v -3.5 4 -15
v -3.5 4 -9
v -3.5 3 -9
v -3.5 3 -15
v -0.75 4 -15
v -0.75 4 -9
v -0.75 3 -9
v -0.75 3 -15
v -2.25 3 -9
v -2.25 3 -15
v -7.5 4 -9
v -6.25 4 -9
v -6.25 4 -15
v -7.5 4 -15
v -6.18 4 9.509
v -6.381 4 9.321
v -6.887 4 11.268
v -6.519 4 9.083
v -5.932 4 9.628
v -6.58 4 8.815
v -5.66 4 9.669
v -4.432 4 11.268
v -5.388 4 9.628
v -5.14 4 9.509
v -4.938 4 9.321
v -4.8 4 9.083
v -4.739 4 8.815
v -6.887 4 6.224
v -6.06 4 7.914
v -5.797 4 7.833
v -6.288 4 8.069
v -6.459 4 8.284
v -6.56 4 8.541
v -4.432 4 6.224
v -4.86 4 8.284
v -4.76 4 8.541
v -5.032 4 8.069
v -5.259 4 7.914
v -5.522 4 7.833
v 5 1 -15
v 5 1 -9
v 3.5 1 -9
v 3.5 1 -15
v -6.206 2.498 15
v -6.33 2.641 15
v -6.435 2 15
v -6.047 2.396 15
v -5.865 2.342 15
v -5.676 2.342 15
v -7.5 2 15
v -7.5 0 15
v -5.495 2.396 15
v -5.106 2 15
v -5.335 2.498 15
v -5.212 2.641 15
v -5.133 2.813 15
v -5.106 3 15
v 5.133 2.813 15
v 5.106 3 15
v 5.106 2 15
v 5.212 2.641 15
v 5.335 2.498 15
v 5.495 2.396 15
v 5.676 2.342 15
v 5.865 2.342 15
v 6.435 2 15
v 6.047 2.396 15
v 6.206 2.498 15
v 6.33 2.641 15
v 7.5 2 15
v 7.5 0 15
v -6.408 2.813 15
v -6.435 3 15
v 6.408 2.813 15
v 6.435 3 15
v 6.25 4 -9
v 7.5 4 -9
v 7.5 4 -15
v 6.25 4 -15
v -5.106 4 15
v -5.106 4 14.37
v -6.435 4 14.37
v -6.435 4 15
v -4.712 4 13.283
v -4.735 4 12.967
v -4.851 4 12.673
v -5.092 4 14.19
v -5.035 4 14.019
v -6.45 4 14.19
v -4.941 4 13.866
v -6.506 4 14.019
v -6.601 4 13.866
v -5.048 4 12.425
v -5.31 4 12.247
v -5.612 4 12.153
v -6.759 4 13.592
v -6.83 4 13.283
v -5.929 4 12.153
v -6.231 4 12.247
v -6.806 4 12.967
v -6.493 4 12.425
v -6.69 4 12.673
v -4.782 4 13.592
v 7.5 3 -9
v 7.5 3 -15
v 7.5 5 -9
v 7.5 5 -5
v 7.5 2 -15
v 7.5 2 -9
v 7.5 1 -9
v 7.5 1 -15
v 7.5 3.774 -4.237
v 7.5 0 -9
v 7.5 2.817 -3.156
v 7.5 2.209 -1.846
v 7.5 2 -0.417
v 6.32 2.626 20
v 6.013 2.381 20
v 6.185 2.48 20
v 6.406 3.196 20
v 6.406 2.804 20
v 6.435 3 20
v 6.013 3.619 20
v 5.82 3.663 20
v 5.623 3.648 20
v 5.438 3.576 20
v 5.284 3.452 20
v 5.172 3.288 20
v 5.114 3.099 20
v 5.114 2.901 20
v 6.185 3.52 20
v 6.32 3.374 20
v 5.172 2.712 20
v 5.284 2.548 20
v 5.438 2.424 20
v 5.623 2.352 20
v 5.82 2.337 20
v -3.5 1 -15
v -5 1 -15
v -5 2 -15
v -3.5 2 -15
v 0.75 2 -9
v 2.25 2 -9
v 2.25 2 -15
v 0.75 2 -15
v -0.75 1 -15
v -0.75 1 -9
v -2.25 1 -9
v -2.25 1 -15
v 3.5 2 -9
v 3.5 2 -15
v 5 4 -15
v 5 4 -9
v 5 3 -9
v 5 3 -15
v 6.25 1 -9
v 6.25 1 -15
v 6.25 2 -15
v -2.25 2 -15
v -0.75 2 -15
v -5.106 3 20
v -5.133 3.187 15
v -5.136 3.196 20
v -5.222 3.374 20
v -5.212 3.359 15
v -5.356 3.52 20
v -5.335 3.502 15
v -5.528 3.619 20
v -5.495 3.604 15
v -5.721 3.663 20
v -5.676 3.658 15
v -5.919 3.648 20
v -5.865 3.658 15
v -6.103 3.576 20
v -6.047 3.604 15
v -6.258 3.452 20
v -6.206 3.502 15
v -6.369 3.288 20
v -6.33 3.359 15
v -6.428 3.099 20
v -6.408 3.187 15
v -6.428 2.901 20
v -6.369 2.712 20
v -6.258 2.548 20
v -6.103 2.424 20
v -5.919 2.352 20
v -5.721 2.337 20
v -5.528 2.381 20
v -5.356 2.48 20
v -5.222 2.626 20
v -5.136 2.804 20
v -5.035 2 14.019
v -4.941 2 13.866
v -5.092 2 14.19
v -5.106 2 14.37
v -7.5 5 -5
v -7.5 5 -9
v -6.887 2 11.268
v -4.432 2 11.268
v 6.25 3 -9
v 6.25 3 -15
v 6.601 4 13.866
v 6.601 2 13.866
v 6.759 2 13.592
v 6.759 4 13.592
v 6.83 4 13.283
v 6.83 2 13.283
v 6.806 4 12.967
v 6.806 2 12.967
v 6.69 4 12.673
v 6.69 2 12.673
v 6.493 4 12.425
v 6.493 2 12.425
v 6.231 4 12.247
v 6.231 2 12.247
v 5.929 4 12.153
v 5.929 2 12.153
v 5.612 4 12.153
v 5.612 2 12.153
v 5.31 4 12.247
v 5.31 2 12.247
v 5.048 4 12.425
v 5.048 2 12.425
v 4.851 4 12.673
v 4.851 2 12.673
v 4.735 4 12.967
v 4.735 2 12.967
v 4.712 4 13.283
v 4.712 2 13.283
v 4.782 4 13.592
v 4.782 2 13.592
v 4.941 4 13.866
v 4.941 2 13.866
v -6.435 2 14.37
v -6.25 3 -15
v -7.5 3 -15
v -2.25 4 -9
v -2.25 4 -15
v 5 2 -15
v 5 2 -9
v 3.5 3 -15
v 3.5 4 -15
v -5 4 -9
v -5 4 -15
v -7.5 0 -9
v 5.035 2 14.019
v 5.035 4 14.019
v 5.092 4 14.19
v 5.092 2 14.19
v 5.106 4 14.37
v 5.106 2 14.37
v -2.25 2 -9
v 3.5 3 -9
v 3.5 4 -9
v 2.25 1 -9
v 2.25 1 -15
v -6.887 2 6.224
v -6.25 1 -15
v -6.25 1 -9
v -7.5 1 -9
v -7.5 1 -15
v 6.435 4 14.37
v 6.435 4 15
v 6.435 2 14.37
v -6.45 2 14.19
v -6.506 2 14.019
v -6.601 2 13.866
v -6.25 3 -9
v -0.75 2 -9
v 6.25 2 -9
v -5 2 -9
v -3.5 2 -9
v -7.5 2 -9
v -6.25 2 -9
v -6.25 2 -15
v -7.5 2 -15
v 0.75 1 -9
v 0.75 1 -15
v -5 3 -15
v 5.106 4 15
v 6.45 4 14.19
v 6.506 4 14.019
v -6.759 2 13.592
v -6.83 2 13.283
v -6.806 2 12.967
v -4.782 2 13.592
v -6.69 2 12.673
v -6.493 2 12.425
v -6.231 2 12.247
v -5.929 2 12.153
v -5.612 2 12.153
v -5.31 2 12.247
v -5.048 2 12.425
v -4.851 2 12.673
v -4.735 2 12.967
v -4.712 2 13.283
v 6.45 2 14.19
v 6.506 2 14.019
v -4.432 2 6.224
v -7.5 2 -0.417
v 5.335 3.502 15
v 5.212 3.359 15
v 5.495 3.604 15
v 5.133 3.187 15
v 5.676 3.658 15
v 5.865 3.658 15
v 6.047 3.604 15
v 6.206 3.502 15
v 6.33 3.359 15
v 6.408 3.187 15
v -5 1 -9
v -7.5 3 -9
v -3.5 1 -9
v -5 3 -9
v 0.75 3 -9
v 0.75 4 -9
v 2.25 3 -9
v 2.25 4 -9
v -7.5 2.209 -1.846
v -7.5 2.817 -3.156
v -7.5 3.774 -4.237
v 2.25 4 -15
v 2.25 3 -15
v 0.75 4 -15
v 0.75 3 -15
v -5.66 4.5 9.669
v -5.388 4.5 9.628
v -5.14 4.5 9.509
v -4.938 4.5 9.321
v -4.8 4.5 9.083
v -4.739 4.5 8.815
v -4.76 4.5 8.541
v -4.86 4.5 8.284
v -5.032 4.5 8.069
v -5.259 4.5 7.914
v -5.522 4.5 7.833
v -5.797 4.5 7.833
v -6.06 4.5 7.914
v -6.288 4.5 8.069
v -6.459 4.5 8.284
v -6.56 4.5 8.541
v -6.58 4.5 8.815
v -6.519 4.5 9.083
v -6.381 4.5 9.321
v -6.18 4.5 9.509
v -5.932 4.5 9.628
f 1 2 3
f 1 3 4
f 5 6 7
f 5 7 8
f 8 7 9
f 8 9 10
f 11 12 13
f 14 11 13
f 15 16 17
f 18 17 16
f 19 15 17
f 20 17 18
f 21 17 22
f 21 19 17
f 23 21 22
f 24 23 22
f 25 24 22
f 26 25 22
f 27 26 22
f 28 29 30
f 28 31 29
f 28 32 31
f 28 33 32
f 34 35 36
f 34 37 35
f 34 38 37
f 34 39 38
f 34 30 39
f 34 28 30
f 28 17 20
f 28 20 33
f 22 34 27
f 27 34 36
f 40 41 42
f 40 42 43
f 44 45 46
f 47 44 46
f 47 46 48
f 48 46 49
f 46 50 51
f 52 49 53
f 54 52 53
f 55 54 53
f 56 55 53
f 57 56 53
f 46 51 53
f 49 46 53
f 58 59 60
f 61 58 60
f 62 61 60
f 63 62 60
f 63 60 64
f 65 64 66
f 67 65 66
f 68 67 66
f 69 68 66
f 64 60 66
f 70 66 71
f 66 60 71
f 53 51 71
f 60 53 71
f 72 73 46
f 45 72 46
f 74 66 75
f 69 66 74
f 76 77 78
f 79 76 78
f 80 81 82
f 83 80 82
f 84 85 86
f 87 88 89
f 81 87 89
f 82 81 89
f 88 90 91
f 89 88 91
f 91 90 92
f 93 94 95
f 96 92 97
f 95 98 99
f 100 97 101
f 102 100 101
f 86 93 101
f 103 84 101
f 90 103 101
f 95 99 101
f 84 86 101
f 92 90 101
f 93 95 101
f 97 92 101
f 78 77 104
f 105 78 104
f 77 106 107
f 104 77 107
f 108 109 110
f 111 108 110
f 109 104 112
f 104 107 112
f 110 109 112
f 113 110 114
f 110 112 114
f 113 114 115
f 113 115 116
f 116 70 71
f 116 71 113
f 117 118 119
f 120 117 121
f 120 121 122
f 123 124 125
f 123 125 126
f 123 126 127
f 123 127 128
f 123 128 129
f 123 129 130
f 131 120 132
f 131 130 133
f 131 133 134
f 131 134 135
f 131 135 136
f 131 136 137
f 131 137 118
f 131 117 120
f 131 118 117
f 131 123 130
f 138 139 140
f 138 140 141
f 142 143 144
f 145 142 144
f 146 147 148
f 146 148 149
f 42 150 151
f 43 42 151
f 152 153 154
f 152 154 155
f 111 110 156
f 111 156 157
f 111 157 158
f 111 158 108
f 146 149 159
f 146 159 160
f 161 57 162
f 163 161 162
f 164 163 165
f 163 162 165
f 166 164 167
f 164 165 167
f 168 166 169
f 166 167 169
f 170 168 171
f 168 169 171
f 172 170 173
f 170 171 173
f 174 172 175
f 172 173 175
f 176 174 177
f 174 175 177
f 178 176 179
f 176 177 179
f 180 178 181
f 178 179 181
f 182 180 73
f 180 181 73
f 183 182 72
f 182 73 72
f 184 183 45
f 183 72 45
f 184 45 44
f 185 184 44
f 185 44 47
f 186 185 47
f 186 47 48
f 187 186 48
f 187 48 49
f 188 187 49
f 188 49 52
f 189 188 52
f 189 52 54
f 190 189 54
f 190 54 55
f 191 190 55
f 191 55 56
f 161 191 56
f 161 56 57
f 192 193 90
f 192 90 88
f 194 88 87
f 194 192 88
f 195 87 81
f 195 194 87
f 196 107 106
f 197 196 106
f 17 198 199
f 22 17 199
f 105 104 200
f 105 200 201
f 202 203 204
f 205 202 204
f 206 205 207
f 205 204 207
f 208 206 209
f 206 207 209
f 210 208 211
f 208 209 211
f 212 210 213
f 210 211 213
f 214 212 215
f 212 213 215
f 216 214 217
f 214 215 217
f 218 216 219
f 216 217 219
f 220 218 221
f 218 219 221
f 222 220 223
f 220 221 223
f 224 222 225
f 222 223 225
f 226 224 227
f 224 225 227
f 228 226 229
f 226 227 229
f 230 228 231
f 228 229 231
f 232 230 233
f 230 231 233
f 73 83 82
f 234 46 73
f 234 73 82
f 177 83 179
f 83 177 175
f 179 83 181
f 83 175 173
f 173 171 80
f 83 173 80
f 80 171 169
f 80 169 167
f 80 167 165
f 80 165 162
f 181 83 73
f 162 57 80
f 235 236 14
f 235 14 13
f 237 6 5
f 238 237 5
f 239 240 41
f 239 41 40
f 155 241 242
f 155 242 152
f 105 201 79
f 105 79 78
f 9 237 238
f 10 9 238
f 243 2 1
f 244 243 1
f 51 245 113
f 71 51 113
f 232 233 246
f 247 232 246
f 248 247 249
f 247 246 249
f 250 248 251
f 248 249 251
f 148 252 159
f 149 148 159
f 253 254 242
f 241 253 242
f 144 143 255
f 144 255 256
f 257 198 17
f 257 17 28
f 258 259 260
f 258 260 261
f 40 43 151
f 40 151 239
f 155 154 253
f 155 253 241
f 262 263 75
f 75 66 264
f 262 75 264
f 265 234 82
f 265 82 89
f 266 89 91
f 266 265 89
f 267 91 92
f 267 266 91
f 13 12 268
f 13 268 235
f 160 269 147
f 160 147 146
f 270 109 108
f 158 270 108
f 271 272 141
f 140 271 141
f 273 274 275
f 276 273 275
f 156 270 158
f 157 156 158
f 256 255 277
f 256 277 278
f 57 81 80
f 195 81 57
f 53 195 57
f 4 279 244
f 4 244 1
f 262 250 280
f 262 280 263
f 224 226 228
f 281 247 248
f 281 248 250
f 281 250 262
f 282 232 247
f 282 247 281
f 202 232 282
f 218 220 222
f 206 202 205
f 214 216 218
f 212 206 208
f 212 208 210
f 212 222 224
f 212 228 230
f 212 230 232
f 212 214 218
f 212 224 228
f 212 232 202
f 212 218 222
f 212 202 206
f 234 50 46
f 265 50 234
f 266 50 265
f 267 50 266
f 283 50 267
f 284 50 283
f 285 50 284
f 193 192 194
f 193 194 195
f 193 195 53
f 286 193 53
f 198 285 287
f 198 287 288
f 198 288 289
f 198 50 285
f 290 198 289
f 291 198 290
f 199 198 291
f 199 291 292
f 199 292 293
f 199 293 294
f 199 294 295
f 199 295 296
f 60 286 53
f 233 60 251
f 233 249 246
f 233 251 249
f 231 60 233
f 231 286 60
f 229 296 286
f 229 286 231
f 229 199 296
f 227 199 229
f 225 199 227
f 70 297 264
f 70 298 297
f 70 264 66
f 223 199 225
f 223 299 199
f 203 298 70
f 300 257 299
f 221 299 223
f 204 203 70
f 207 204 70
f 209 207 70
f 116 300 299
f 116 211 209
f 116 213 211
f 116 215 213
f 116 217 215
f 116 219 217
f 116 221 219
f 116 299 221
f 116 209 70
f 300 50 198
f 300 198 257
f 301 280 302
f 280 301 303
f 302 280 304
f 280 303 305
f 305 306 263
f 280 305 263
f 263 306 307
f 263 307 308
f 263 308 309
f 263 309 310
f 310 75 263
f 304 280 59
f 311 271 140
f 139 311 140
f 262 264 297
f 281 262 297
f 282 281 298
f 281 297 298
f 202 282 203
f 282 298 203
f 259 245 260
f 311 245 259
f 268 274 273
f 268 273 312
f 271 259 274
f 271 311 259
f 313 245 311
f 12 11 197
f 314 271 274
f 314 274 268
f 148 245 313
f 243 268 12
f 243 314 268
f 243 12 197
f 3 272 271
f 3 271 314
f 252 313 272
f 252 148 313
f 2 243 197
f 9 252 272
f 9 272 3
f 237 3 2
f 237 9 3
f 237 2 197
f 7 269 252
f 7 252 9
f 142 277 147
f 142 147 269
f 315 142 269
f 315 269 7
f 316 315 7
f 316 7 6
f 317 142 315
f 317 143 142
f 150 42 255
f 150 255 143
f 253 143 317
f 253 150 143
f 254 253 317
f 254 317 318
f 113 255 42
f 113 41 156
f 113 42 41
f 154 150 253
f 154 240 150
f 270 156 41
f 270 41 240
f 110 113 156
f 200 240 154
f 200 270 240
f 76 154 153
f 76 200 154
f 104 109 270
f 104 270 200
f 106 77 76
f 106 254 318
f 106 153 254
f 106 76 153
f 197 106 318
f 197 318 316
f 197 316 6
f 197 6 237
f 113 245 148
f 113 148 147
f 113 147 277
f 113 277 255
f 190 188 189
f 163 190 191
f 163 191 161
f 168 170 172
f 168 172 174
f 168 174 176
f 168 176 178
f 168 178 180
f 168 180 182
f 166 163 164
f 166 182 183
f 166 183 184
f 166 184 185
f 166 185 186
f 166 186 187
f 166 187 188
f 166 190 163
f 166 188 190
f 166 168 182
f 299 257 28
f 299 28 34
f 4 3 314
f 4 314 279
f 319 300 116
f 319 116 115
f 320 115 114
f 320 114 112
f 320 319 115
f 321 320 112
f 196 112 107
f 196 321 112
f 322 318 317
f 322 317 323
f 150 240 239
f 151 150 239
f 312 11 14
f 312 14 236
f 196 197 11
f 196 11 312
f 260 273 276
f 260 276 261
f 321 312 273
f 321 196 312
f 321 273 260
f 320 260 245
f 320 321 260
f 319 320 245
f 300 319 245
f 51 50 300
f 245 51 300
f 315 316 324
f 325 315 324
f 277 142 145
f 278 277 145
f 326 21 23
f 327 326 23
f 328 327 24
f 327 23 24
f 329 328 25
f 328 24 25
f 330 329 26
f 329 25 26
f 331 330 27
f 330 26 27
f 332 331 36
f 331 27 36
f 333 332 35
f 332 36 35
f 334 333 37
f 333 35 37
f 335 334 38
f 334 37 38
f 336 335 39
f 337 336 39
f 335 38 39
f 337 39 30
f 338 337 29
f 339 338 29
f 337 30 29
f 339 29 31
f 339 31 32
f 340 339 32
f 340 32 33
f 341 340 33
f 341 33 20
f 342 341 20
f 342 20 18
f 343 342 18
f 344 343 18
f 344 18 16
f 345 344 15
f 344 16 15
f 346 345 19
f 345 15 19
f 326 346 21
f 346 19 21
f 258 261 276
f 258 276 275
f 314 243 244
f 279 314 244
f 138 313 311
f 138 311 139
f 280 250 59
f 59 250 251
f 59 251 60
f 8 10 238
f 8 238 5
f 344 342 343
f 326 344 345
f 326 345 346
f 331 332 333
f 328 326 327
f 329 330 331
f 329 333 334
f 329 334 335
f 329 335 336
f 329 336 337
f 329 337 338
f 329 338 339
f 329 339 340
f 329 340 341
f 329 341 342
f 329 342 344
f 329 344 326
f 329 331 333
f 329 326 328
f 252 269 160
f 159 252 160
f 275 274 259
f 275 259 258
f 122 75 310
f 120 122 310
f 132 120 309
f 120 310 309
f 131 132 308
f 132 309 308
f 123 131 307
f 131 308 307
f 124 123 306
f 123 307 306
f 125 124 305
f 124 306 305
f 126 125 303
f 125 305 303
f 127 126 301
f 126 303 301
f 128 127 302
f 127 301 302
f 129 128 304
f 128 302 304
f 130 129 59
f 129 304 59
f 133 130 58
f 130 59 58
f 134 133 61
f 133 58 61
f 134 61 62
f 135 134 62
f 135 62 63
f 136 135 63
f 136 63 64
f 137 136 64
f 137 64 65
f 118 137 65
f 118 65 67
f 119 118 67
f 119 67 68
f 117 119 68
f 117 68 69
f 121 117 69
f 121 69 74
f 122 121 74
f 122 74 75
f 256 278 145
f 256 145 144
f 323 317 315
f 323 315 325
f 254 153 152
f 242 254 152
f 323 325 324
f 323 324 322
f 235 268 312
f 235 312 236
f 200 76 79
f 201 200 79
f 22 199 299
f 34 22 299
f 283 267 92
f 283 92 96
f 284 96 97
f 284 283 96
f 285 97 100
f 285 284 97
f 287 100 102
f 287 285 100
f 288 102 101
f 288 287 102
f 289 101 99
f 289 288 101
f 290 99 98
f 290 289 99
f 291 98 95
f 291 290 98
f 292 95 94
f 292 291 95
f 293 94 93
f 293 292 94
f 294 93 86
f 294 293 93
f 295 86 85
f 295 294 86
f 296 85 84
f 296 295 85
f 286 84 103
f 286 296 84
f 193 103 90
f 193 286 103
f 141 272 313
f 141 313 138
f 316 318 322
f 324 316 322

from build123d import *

# Parameters (mm, degrees)
SKETCH2_W           = 15
SKETCH2_H           = 30
BOSS_EXTRUDE1_DEPTH = 2
SKETCH3_W           = 10
SKETCH3_H           = 5
BOSS_EXTRUDE2_DEPTH = 15
SKETCH4_W           = 6
SKETCH4_H           = 1
CUT_EXTRUDE1_DEPTH  = 15
SKETCH5_W           = 1.25
SKETCH5_H           = 6
SKETCH5_W_2         = 0.75
CUT_EXTRUDE2_DEPTH  = 18.24093965
FILLET1_R           = 5
BOSS_EXTRUDE3_DEPTH = 2
SKETCH7_R           = 0.66453872
BOSS_EXTRUDE4_DEPTH = 5
SKETCH8_W           = 2.454634116
SKETCH8_H           = 5.043768733
BOSS_EXTRUDE5_DEPTH = 2
SKETCH9_R           = 0.923137451
BOSS_EXTRUDE6_DEPTH = 0.5


with BuildPart() as part:
    # Sketch2 → Boss-Extrude1 (new body)
    with BuildSketch(Plane(origin=(0, 0, 0), x_dir=(1, 0, 0), z_dir=(0, 1, 0))):
        Rectangle(SKETCH2_W, SKETCH2_H)
    extrude(amount=BOSS_EXTRUDE1_DEPTH)

    # Sketch3 → Boss-Extrude2 (add)
    with BuildSketch(Plane(origin=(7.5, 0, 0), x_dir=(0, 0, -1), z_dir=(1, 0, 0))):
        with Locations((10, 2.5)):
            Rectangle(SKETCH3_W, SKETCH3_H)
    extrude(amount=-BOSS_EXTRUDE2_DEPTH)

    # Sketch4 → Cut-Extrude1 (cut)
    with BuildSketch(Plane(origin=(7.5, 0, 0), x_dir=(0, 0, -1), z_dir=(1, 0, 0))):
        with Locations((12, 0.5)):
            Rectangle(SKETCH4_W, SKETCH4_H)
        with Locations((12, 2.5)):
            Rectangle(SKETCH4_W, SKETCH4_H)
        with Locations((12, 4.5)):
            Rectangle(SKETCH4_W, SKETCH4_H)
    extrude(amount=-CUT_EXTRUDE1_DEPTH, mode=Mode.SUBTRACT)

    # Sketch5 → Cut-Extrude2 (cut, through all)
    with BuildSketch(Plane(origin=(0, 4, 0), x_dir=(1, 0, 0), z_dir=(0, 1, 0))):
        with Locations((5.625, 12)):
            Rectangle(SKETCH5_W, SKETCH5_H)
        with Locations((2.875, 12)):
            Rectangle(SKETCH5_W, SKETCH5_H)
        with Locations((0.375, 12)):
            Rectangle(SKETCH5_W_2, SKETCH5_H)
        with Locations((-0.375, 12)):
            Rectangle(SKETCH5_W_2, SKETCH5_H)
        with Locations((-2.875, 12)):
            Rectangle(SKETCH5_W, SKETCH5_H)
        with Locations((-5.625, 12)):
            Rectangle(SKETCH5_W, SKETCH5_H)
    extrude(amount=-CUT_EXTRUDE2_DEPTH, mode=Mode.SUBTRACT)

    # Fillet1
    # the kernel refuses this fillet: 5 mm, written as the material it adds along each edge
    with BuildSketch(Plane(origin=(-7.5, 2, -5), x_dir=(0, 1, 0), z_dir=(1, 0, 0))) as fillet1_piece_1:
        with BuildLine():
            CenterArc((5, 4.582575695), FILLET1_R, 180, 66.421821522)
            Line((0, 4.582575695), (-0.1, 4.582575695))
            Line((-0.1, 4.582575695), (-0.1, 0))
            Line((-0.1, 0), (0, -0.1))
            ThreePointArc((0, -0.1), (1.5, -0.1), (2.96, -0.091651514))
            Line((2.96, -0.091651514), (3, 0))
        make_face()
    extrude(amount=15)

    # Sketch6 → Boss-Extrude3 (add)
    with BuildSketch(Plane(origin=(0, 2, 0), x_dir=(1, 0, 0), z_dir=(0, 1, 0))):
        with BuildLine():
            Line((5.106120026, -14.369842053), (5.106120026, -15))
            Line((5.106120026, -15), (6.435197466, -15))
            Line((6.435197466, -15), (6.435197466, -14.369842053))
            ThreePointArc((6.435197466, -14.369842053), (6.472638981, -14.102943479), (6.600769462, -13.865837393))
            ThreePointArc((6.600769462, -13.865837393), (5.770658746, -12.141497566), (4.940548031, -13.865837393))
            ThreePointArc((4.940548031, -13.865837393), (5.068678511, -14.102943479), (5.106120026, -14.369842053))
        make_face()
        with BuildLine():
            Line((-6.435197466, -15), (-6.435197466, -14.369842053))
            ThreePointArc((-6.435197466, -14.369842053), (-6.472638981, -14.102943479), (-6.600769462, -13.865837393))
            ThreePointArc((-6.600769462, -13.865837393), (-5.770658746, -12.141497566), (-4.940548031, -13.865837393))
            ThreePointArc((-4.940548031, -13.865837393), (-5.068678511, -14.102943479), (-5.106120026, -14.369842053))
            Line((-5.106120026, -14.369842053), (-5.106120026, -15))
            Line((-5.106120026, -15), (-6.435197466, -15))
        make_face()
    extrude(amount=BOSS_EXTRUDE3_DEPTH)

    # Sketch7 → Boss-Extrude4 (add)
    with BuildSketch(Plane.XY.offset(15)):
        with Locations((-5.770658746, 3)):
            Circle(SKETCH7_R)
        with Locations((5.770658746, 3)):
            Circle(SKETCH7_R)
    extrude(amount=BOSS_EXTRUDE4_DEPTH)

    # Sketch8 → Boss-Extrude5 (add)
    with BuildSketch(Plane(origin=(0, 2, 0), x_dir=(1, 0, 0), z_dir=(0, 1, 0))):
        with Locations((-5.659720594, -8.745923689)):
            Rectangle(SKETCH8_W, SKETCH8_H)
    extrude(amount=BOSS_EXTRUDE5_DEPTH)

    # Sketch9 → Boss-Extrude6 (add)
    with BuildSketch(Plane(origin=(0, 4, 0), x_dir=(1, 0, 0), z_dir=(0, 1, 0))):
        with Locations(Location((-5.659720594, -8.745923689, 0), (0, 0, 270))):
            Circle(SKETCH9_R)
    extrude(amount=BOSS_EXTRUDE6_DEPTH)


solid = part.part
